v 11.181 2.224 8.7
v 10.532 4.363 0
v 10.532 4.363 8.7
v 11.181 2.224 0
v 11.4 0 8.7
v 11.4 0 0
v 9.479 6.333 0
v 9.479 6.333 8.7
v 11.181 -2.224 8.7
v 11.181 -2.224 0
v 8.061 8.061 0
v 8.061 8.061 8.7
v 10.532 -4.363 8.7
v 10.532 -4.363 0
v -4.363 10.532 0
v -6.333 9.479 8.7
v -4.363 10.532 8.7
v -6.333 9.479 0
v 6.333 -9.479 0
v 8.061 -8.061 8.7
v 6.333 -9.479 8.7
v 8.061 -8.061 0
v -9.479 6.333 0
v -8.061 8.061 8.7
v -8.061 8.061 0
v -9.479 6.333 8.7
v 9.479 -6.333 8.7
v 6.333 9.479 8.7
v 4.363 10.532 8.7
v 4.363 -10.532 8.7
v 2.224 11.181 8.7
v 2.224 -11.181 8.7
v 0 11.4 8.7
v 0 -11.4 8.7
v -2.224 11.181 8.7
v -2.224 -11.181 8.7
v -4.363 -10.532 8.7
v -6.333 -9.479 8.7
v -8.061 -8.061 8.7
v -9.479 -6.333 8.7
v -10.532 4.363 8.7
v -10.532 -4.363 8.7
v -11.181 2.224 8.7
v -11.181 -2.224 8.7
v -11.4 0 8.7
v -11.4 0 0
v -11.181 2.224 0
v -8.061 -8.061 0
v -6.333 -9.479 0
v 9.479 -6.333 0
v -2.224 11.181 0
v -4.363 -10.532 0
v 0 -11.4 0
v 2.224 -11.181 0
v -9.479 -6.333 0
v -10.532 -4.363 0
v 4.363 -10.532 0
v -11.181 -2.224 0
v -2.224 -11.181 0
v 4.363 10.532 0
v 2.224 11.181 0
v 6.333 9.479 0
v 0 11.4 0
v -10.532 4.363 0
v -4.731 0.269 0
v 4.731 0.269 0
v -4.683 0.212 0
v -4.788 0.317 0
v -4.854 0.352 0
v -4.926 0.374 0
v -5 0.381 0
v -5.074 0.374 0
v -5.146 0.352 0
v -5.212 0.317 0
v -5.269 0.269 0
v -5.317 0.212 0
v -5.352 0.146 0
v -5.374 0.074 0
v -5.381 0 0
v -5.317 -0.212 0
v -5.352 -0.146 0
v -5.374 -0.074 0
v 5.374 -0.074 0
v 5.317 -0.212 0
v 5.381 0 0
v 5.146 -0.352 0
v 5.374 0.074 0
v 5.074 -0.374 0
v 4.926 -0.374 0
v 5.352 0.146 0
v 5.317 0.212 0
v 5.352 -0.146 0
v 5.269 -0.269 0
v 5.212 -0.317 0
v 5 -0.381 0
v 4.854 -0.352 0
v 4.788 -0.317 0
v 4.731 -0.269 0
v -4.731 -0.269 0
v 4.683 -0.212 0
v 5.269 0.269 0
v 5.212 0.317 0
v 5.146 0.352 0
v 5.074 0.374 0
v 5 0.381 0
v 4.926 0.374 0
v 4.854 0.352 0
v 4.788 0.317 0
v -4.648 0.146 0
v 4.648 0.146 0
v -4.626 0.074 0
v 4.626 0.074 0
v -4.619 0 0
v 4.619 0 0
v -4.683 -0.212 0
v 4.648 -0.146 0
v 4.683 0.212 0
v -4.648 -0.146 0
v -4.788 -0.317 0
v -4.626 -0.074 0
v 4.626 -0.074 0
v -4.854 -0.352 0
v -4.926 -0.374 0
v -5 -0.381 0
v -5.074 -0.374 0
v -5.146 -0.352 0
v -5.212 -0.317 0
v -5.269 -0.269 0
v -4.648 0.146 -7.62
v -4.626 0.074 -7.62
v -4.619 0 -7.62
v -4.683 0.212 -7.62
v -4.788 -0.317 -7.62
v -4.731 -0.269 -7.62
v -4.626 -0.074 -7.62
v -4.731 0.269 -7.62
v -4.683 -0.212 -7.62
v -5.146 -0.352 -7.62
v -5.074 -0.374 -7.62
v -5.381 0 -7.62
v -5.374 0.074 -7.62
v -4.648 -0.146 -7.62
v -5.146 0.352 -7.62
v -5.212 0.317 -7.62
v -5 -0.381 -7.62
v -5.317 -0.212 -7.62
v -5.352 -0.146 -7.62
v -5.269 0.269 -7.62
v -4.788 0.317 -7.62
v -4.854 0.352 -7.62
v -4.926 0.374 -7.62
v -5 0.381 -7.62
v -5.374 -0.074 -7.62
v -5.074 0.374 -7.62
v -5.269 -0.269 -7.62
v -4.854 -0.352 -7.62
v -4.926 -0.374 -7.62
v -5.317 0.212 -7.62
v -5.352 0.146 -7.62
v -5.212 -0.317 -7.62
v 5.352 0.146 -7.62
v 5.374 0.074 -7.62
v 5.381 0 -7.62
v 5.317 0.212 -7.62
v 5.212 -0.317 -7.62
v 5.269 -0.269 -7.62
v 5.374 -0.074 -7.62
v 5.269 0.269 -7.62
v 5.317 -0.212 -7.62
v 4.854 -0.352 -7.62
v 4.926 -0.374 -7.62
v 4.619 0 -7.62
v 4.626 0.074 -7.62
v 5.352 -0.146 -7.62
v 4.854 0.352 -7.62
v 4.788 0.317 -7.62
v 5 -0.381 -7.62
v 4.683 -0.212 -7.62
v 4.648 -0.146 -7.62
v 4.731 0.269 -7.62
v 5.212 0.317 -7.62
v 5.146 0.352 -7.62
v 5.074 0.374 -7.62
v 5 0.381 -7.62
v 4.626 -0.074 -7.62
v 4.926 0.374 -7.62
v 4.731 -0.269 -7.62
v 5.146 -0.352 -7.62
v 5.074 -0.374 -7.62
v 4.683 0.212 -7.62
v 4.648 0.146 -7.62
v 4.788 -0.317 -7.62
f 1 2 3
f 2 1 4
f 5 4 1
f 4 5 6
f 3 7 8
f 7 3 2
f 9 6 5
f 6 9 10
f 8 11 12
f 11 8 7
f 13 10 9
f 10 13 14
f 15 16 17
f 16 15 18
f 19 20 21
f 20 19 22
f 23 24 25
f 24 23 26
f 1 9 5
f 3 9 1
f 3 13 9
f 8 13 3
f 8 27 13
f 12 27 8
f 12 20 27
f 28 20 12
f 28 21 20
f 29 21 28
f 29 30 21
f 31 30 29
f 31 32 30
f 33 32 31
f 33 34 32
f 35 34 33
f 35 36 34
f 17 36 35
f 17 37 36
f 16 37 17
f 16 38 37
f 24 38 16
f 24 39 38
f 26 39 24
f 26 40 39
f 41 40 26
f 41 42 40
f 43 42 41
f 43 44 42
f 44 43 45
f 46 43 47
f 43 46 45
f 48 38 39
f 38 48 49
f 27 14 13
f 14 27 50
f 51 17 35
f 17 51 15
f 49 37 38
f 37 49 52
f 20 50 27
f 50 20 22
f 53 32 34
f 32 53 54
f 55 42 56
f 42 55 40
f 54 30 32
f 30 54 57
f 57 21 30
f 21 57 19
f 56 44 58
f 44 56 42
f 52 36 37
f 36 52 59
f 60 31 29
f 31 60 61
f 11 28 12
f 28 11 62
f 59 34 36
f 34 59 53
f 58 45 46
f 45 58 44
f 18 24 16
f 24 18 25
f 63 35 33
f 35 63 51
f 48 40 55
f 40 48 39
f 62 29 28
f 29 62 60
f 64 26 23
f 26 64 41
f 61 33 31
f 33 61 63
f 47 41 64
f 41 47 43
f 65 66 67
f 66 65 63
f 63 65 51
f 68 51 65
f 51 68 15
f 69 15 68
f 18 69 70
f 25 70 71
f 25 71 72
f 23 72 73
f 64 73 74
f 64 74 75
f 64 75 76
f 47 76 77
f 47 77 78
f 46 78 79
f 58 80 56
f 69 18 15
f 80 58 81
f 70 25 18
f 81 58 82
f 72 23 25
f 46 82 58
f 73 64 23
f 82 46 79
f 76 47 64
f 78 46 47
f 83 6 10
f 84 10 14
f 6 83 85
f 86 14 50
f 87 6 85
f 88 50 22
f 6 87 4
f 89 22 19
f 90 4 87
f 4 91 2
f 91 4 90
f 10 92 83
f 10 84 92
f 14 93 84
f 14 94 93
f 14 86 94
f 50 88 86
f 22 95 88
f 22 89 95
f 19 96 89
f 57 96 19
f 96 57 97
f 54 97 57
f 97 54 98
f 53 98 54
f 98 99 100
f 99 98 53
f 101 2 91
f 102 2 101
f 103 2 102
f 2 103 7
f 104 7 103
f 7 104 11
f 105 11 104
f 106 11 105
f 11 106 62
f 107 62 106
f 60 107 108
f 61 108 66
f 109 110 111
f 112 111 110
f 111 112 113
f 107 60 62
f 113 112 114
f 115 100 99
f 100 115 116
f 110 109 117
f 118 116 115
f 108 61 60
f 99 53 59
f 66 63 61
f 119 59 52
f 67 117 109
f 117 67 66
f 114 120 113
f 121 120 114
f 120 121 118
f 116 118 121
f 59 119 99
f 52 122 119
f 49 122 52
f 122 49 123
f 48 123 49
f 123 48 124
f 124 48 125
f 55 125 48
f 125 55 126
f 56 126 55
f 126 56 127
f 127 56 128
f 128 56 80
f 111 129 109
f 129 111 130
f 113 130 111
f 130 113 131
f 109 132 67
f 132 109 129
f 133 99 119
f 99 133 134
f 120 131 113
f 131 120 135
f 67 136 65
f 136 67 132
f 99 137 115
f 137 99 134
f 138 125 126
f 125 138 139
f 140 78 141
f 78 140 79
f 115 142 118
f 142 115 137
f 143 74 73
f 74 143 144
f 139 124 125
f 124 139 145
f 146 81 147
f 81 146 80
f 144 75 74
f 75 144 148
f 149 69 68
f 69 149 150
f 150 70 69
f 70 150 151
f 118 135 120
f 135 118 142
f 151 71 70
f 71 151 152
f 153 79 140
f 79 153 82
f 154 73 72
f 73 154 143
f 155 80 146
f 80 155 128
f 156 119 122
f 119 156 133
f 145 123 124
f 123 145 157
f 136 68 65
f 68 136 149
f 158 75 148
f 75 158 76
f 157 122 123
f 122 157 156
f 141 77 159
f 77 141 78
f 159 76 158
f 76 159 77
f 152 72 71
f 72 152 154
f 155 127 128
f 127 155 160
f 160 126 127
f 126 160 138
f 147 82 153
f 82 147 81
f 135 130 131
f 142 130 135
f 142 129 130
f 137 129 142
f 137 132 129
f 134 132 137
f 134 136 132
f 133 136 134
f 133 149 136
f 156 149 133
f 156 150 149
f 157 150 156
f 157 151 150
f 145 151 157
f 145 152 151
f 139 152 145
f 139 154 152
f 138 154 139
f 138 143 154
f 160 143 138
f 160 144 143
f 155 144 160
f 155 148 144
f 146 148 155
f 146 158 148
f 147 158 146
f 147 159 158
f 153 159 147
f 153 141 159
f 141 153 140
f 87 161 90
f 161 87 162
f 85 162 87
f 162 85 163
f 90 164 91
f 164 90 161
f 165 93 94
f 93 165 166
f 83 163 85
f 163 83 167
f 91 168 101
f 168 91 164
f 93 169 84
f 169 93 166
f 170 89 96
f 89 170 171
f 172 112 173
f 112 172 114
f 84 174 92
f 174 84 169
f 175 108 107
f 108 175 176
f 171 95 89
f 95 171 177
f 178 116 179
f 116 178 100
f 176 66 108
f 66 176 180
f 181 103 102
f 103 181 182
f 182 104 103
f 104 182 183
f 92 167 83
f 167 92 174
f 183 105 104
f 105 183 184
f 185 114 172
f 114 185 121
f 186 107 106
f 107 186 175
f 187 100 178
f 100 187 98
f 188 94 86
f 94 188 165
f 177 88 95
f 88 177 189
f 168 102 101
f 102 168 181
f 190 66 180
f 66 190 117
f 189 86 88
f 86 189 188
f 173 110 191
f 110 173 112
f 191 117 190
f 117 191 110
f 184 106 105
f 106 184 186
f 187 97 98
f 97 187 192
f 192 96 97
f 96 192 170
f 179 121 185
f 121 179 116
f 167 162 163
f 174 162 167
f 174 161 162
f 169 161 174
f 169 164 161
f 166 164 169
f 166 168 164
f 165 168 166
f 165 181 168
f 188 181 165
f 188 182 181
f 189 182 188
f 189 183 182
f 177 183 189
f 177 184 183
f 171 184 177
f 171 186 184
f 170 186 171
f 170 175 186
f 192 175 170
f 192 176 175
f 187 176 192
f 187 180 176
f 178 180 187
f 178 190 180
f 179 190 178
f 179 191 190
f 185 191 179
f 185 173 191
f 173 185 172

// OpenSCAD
//
// speaker SM231508-1
//
$fn = 32;
function mm(x) = (x)*25.4;
thk = 1.6;

module pin_at(x,y) {
  translate( [x, y, mm(-0.3)])
    color("gold")
    cylinder( h=mm(0.4)+thk, d=mm(0.03));
}

module speaker() {
  color("gray")
    cylinder( h=8.7, d=22.8);
  pin_at( -5, 0);
  pin_at( 5, 0);
}

speaker();
